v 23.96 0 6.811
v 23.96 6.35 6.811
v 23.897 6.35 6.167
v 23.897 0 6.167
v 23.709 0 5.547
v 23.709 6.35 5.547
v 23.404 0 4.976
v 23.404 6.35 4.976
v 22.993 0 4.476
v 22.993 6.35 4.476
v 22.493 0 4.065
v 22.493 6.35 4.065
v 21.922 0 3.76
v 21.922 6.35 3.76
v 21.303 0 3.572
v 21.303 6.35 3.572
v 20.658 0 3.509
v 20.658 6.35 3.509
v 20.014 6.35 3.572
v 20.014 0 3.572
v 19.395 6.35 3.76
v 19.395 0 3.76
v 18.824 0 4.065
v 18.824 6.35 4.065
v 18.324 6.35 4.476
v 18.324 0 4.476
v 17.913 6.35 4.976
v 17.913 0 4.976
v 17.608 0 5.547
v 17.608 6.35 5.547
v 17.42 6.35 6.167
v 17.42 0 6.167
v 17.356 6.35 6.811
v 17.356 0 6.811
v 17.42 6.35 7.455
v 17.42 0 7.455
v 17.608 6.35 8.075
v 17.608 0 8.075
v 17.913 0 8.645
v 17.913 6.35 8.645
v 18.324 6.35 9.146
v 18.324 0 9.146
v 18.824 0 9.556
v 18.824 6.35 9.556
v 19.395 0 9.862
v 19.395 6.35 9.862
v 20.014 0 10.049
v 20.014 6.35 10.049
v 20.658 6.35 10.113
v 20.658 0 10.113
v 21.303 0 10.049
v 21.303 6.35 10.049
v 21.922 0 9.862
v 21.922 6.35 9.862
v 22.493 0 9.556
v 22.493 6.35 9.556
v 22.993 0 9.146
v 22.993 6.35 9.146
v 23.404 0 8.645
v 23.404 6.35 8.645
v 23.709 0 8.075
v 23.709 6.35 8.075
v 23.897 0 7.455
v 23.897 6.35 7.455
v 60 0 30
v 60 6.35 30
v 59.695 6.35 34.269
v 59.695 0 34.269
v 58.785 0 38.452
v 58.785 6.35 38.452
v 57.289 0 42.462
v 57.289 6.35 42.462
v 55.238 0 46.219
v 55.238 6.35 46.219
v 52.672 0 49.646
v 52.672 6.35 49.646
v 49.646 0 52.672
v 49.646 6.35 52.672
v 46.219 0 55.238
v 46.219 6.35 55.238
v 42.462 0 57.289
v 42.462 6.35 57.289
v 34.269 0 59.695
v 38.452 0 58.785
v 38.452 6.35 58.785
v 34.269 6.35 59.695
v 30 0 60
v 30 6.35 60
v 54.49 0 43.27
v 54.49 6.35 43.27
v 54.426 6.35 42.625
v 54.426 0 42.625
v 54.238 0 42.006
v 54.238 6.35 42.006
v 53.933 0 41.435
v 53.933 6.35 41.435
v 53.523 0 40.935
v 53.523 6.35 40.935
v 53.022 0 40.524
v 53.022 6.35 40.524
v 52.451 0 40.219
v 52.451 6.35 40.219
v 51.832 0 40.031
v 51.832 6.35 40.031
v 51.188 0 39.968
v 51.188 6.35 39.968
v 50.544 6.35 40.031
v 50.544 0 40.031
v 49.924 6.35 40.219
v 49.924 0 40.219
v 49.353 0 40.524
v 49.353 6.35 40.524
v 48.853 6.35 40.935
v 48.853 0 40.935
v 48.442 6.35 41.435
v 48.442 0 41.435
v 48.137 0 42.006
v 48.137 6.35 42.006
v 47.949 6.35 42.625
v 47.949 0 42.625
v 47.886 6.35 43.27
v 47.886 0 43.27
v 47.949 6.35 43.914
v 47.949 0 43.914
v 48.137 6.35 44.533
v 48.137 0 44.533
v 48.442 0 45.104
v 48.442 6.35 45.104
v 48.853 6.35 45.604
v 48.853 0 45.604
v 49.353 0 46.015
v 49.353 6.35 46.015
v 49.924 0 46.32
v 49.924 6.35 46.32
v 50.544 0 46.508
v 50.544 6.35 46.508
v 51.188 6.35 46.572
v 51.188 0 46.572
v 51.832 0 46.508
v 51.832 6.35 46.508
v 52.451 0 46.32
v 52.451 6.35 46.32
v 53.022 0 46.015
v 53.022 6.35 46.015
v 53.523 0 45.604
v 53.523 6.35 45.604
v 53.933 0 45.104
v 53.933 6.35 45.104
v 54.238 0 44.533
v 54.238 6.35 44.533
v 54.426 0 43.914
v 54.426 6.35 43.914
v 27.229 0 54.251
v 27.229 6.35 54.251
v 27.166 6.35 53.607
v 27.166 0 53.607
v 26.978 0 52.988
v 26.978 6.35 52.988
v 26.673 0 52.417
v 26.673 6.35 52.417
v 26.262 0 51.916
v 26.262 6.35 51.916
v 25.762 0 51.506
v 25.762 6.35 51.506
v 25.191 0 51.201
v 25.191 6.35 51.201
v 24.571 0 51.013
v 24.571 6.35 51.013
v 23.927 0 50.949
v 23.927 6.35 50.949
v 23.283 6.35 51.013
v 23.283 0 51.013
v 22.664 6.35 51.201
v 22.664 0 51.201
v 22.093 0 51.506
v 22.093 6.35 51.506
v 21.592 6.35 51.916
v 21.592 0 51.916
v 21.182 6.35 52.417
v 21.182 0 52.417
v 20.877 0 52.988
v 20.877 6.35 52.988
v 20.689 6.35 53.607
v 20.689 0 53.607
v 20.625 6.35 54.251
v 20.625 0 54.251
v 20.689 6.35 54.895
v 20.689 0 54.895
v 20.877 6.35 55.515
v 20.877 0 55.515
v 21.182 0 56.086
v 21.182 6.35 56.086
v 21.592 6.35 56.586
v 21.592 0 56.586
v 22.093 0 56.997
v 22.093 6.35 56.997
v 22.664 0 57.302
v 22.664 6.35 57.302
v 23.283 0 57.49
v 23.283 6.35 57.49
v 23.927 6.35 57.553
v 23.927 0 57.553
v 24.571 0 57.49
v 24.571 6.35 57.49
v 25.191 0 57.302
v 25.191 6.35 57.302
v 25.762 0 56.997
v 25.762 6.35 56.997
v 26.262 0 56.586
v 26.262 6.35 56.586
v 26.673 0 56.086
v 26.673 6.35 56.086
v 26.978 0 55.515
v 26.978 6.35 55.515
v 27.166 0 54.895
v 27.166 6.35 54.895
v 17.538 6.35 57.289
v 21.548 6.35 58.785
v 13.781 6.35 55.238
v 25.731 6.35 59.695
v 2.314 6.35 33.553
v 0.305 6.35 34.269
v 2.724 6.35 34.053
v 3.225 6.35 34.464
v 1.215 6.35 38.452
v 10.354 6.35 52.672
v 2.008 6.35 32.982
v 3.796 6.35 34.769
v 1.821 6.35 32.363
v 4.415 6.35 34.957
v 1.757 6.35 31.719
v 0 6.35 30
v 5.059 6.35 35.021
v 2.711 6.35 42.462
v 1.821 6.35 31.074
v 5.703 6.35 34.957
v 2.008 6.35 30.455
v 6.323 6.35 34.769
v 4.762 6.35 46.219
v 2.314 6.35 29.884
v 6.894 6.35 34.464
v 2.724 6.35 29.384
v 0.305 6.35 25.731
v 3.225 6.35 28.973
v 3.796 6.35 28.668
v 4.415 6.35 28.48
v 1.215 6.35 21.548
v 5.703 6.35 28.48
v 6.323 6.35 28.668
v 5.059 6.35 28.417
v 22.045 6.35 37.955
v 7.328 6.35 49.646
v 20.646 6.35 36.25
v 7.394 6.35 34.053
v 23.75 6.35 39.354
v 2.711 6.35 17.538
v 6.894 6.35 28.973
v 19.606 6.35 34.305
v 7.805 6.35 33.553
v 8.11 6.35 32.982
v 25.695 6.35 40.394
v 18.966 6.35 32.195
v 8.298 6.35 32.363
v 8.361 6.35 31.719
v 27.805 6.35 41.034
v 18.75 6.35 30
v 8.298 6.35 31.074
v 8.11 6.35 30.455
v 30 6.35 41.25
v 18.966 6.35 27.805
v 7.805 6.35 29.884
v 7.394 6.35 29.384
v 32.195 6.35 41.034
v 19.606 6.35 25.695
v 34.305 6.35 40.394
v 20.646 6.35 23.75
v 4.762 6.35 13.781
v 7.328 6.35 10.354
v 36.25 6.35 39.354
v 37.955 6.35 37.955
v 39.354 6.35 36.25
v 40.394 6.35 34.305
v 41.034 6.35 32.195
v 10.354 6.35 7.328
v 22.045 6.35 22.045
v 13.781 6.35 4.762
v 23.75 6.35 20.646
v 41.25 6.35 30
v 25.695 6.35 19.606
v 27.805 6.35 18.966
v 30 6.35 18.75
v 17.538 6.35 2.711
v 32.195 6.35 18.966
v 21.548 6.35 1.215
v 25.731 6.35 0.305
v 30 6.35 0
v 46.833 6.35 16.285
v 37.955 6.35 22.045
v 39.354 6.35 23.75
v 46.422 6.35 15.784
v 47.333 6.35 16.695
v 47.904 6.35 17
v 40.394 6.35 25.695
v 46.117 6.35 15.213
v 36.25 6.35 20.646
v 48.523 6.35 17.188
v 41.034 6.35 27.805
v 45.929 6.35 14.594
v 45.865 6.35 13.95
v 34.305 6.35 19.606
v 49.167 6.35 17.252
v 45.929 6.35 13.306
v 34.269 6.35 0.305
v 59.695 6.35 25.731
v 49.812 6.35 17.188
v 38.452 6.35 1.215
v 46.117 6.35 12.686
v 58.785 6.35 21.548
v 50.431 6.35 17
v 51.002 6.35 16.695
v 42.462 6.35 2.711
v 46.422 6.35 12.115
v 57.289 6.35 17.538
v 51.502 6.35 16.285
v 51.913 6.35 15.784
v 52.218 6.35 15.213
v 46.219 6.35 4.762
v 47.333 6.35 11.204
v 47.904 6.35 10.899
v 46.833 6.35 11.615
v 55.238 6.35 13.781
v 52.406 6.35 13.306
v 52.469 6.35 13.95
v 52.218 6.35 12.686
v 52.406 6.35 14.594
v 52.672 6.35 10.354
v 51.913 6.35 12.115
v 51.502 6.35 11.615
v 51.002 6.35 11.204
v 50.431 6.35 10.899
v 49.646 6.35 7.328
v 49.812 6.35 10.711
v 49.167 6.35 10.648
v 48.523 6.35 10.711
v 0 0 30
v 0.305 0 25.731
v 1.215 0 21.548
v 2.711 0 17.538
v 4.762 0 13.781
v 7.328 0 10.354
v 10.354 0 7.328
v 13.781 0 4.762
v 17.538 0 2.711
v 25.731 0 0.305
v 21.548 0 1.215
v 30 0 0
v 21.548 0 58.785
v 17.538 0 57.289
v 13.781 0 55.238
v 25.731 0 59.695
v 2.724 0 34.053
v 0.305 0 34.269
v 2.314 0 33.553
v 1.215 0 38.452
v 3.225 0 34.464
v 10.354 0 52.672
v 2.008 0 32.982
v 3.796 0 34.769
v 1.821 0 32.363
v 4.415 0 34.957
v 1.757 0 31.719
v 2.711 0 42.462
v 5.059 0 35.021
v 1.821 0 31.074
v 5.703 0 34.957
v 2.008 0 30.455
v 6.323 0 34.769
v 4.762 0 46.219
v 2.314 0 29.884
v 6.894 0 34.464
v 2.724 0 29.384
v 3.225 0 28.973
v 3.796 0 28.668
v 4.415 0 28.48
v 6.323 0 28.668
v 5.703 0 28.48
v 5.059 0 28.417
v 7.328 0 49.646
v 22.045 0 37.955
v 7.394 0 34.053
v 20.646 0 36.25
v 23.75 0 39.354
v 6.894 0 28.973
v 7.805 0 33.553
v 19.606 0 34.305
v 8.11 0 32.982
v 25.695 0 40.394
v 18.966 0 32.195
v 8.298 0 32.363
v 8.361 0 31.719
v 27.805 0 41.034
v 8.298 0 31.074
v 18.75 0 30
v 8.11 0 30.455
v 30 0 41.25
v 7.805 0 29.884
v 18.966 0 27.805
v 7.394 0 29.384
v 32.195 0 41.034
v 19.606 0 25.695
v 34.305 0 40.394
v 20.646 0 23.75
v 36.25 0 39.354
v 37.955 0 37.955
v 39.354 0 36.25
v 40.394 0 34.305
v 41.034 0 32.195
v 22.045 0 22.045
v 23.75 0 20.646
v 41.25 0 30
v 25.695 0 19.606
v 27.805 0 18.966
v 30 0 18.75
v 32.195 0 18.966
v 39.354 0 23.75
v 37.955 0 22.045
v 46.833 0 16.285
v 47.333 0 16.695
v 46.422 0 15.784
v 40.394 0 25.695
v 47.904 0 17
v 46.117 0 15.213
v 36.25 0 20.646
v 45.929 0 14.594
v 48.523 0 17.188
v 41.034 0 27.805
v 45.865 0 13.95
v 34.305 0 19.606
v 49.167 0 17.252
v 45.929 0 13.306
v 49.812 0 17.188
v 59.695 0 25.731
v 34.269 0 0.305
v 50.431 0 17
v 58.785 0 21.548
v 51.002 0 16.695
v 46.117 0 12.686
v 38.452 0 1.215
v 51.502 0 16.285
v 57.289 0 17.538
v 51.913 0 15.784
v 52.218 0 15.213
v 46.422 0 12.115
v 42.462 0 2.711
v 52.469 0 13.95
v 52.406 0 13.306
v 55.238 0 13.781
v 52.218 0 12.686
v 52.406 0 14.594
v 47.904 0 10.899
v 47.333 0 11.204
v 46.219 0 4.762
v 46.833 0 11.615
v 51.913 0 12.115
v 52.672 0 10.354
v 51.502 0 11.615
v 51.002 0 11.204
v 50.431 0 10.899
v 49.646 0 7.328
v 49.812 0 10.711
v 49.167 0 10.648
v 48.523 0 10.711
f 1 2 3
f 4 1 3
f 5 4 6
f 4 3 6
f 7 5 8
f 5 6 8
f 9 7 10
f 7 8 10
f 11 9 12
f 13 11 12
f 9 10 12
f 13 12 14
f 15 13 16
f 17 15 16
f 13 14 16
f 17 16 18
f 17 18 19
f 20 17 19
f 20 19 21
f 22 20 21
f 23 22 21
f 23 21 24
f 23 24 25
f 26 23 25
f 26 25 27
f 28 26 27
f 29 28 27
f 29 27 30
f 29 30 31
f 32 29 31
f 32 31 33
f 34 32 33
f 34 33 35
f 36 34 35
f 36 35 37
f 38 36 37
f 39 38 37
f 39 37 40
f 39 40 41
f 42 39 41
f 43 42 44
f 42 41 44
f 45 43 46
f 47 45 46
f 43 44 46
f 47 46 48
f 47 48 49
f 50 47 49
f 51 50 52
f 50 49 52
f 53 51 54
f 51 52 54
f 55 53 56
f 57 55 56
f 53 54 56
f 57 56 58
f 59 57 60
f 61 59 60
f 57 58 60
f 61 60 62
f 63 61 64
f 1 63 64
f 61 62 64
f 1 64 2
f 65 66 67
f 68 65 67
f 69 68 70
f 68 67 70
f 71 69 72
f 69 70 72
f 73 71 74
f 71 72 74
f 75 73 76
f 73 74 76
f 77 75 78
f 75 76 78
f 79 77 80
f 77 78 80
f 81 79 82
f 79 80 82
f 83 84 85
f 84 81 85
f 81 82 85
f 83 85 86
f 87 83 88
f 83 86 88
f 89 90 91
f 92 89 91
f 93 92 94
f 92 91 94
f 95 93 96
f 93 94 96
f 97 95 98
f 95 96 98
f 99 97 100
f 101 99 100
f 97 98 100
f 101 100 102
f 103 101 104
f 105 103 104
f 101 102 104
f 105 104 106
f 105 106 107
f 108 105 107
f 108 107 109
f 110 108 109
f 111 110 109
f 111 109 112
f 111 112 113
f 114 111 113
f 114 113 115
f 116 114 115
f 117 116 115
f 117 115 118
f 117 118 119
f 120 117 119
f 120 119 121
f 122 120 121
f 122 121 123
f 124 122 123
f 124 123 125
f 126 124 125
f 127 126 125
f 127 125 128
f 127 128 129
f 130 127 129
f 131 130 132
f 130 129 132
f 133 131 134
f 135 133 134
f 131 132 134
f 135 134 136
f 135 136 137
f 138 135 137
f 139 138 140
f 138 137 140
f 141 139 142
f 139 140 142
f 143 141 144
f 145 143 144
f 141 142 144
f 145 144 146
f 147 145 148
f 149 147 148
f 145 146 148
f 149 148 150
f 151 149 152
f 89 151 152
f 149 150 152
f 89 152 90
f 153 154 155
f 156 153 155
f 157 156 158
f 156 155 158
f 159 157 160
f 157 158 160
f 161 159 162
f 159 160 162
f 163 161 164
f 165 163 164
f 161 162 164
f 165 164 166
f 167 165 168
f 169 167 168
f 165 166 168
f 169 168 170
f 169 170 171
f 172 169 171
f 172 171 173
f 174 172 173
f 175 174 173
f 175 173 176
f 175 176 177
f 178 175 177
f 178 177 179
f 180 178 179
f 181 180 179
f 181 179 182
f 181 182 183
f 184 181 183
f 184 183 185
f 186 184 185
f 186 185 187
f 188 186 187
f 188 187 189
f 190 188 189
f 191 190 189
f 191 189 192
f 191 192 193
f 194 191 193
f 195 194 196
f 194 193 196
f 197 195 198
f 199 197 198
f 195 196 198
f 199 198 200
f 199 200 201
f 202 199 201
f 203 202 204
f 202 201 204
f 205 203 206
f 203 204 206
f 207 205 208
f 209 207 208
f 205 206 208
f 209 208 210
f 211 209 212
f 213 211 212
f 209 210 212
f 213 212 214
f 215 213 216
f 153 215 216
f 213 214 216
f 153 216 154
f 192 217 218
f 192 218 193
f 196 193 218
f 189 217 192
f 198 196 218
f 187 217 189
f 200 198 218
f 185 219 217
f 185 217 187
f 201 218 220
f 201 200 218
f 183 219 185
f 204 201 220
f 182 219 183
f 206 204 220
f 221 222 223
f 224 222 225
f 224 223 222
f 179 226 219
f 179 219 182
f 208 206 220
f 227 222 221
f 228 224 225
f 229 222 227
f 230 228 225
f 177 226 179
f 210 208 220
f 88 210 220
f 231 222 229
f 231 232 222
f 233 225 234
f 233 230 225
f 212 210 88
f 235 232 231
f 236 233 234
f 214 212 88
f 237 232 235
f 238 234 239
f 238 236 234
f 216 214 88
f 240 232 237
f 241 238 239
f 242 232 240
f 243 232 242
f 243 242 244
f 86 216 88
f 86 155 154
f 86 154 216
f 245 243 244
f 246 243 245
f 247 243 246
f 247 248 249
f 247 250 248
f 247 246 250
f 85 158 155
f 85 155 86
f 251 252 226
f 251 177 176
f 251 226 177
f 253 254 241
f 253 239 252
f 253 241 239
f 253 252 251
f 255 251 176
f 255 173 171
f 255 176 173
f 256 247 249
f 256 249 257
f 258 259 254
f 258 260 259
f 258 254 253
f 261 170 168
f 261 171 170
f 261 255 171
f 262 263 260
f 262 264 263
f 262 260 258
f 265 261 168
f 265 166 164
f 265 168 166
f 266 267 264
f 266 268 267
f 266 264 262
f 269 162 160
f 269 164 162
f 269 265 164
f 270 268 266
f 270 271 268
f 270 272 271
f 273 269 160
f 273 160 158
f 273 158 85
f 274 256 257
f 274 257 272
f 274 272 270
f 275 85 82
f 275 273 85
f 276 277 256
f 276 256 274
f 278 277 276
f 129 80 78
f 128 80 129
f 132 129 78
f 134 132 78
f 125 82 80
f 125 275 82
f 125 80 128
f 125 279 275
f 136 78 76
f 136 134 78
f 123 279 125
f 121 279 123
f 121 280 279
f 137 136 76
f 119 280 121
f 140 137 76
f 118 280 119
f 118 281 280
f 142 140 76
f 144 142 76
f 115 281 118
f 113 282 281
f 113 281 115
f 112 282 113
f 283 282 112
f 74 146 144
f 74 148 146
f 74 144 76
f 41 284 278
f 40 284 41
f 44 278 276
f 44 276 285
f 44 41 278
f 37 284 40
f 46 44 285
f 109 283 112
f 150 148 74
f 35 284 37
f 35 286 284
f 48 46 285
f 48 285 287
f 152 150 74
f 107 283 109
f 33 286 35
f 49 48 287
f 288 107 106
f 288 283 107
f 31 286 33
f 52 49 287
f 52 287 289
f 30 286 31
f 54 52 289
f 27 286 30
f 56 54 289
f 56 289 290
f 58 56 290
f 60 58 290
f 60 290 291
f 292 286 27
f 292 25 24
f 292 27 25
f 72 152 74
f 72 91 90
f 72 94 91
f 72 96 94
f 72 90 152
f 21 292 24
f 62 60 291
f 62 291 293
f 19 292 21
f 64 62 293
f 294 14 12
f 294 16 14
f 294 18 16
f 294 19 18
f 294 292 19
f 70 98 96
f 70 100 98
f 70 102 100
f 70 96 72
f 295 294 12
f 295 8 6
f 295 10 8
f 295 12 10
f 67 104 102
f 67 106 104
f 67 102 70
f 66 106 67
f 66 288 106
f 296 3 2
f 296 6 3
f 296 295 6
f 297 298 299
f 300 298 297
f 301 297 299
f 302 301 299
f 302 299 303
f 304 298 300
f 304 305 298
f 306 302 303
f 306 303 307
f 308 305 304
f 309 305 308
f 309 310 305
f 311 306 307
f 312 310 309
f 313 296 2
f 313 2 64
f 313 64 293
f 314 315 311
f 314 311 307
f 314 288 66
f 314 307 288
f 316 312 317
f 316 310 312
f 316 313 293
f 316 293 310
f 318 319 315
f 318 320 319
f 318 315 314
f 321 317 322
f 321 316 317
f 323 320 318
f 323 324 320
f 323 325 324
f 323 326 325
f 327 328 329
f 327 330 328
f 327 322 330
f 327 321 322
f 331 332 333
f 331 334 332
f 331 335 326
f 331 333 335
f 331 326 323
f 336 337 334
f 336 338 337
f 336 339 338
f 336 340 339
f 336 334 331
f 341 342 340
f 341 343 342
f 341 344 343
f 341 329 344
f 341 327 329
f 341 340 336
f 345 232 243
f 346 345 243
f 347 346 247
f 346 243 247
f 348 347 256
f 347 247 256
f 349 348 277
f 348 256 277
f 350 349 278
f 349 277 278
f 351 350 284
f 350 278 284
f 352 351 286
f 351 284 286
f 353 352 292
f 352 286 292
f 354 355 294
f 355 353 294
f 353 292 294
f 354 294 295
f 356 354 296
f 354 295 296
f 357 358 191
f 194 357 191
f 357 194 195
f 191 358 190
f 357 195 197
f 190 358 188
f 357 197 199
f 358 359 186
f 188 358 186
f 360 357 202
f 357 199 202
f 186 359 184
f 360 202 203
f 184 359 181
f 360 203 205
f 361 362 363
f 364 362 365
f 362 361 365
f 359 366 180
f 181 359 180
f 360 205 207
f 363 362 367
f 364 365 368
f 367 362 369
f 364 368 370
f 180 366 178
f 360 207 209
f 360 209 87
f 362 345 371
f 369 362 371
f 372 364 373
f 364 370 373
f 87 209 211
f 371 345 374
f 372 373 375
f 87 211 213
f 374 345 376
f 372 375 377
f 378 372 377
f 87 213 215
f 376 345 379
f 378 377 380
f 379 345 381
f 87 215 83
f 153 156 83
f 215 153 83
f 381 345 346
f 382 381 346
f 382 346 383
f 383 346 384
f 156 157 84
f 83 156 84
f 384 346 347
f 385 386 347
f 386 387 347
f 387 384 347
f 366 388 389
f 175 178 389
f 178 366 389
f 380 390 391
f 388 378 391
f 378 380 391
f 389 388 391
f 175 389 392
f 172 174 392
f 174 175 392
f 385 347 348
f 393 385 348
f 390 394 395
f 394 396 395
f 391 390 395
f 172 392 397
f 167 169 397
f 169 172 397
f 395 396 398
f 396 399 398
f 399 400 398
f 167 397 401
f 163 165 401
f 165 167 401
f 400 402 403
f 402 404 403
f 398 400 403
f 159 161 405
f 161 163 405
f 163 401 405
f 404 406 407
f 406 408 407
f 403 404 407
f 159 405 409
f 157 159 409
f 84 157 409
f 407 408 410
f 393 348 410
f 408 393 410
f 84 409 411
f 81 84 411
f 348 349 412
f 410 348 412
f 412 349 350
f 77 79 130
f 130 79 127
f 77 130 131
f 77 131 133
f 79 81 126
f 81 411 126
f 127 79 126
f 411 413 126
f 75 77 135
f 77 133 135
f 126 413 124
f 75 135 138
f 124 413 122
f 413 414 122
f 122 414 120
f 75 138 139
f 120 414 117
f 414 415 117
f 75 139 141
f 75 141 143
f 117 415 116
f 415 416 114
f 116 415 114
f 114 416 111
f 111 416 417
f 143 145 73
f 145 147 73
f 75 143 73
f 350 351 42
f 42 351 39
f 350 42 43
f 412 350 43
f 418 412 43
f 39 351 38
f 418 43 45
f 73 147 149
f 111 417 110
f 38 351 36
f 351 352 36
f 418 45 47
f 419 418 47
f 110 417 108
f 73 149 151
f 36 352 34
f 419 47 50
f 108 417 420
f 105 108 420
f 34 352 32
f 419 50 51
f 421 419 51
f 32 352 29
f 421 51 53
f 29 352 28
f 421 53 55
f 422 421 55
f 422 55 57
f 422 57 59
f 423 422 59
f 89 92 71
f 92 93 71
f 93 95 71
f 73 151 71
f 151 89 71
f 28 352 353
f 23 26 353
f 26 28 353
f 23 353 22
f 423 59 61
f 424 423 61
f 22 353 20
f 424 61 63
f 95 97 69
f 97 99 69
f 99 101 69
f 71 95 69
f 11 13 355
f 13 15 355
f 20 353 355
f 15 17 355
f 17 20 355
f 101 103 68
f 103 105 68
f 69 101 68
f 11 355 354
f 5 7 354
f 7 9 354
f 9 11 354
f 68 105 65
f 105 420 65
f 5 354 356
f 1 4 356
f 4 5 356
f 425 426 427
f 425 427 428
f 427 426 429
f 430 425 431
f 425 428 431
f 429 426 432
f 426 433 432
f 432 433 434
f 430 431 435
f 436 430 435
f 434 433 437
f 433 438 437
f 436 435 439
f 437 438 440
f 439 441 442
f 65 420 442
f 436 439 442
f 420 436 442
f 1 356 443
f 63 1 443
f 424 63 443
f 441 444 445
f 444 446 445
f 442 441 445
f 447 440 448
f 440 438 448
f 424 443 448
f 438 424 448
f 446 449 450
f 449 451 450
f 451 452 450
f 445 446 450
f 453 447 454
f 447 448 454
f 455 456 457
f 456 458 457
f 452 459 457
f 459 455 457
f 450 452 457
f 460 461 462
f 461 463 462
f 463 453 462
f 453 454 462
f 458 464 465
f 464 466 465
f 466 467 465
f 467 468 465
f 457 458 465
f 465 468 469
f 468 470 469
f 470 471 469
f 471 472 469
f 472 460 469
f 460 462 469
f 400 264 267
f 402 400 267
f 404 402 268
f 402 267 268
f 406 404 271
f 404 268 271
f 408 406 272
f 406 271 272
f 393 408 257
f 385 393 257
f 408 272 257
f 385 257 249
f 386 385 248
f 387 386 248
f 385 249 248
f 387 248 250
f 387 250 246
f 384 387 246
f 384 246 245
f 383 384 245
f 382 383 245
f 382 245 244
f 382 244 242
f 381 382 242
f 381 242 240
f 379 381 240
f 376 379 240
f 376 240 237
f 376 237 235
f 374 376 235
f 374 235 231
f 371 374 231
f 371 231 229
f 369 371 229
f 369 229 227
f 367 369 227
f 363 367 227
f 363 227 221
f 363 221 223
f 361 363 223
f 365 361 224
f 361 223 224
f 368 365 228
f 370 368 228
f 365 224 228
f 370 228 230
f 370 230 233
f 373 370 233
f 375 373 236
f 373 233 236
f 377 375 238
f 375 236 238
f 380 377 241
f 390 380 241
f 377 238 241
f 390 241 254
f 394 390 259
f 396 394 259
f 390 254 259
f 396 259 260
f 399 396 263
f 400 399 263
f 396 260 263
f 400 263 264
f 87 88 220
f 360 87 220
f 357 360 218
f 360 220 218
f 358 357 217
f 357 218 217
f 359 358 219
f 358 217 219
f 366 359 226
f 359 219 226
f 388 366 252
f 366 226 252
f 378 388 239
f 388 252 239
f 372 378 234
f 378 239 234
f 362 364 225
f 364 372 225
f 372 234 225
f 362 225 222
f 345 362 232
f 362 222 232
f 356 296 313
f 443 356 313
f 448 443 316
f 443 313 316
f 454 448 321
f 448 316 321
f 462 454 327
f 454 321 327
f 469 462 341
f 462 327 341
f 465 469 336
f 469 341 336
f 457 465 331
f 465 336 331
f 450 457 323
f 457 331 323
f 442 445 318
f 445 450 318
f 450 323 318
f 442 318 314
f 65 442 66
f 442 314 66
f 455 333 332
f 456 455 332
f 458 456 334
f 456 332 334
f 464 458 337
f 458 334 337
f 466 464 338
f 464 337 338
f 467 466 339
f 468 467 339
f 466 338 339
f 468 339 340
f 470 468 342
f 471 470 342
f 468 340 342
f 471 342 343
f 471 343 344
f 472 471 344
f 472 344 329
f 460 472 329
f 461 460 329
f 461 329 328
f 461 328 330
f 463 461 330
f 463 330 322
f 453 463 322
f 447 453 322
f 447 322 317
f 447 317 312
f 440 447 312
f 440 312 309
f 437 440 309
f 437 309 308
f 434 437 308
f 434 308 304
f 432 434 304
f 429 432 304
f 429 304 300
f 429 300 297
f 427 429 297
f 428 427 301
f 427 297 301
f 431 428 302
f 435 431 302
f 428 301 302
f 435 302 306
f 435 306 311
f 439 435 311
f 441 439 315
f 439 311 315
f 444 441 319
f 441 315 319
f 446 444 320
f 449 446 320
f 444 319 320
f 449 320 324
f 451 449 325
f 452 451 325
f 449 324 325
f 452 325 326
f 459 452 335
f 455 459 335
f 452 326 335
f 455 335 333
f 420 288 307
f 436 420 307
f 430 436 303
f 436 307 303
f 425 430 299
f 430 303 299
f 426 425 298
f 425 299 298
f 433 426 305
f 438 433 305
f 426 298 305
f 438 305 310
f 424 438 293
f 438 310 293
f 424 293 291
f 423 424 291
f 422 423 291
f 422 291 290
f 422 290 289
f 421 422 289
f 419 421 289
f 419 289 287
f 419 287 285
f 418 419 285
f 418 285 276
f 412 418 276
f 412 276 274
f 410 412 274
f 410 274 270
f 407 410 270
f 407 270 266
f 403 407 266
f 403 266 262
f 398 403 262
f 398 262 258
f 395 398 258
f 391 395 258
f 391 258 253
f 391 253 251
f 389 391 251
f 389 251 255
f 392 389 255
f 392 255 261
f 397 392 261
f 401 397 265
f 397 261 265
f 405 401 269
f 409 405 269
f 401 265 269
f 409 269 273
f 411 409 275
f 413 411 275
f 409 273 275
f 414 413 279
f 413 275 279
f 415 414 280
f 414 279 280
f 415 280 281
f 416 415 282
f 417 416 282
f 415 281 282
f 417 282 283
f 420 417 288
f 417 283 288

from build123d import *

# Parameters (mm, degrees)
SKETCH3_W           = 60
SKETCH3_H           = 6.35
BOSS_EXTRUDE2_DEPTH = 60
SKETCH4_R           = 11.25
CUT_EXTRUDE2_DEPTH  = 7.35
SKETCH5_R           = 3.302
CUT_EXTRUDE3_DEPTH  = 7.35
CUT_EXTRUDE4_DEPTH  = 7.35


with BuildPart() as part:
    # Sketch3 → Boss-Extrude2 (new body)
    with BuildSketch(Plane.XY):
        with Locations((30, 3.175)):
            Rectangle(SKETCH3_W, SKETCH3_H)
    extrude(amount=BOSS_EXTRUDE2_DEPTH)

    # Sketch4 → Cut-Extrude2 (cut, through all)
    with BuildSketch(Plane(origin=(0, 6.35, 0), x_dir=(1, 0, 0), z_dir=(0, 1, 0))):
        with Locations((30, -30)):
            Circle(SKETCH4_R)
    extrude(amount=-CUT_EXTRUDE2_DEPTH, mode=Mode.SUBTRACT)

    # Sketch5 → Cut-Extrude3 (cut, through all)
    with BuildSketch(Plane(origin=(0, 6.35, 0), x_dir=(1, 0, 0), z_dir=(0, 1, 0))):
        with Locations((20.658415592, -6.810890471)):
            Circle(SKETCH5_R)
        with Locations((49.167445389, -13.949796348)):
            Circle(SKETCH5_R)
        with Locations((51.187717135, -43.269538146)):
            Circle(SKETCH5_R)
        with Locations((23.927283945, -54.251229241)):
            Circle(SKETCH5_R)
        with Locations((5.059137939, -31.718545794)):
            Circle(SKETCH5_R)
    extrude(amount=-CUT_EXTRUDE3_DEPTH, mode=Mode.SUBTRACT)

    # Sketch6 → Cut-Extrude4 (cut, through all)
    with BuildSketch(Plane(origin=(0, 6.35, 0), x_dir=(1, 0, 0), z_dir=(0, 1, 0))):
        with BuildLine():
            ThreePointArc((0, -30), (8.786796564, -8.786796564), (30, 0))
            Line((30, 0), (0, 0))
            Line((0, 0), (0, -30))
        make_face()
        with BuildLine():
            Line((60, -30), (60, 0))
            Line((60, 0), (30, 0))
            ThreePointArc((30, 0), (51.213203436, -8.786796564), (60, -30))
        make_face()
        with BuildLine():
            Line((60, -60), (60, -30))
            ThreePointArc((60, -30), (51.213203436, -51.213203436), (30, -60))
            Line((30, -60), (60, -60))
        make_face()
        with BuildLine():
            ThreePointArc((30, -60), (8.786796564, -51.213203436), (0, -30))
            Line((0, -30), (0, -60))
            Line((0, -60), (30, -60))
        make_face()
    extrude(amount=-CUT_EXTRUDE4_DEPTH, mode=Mode.SUBTRACT)


solid = part.part
